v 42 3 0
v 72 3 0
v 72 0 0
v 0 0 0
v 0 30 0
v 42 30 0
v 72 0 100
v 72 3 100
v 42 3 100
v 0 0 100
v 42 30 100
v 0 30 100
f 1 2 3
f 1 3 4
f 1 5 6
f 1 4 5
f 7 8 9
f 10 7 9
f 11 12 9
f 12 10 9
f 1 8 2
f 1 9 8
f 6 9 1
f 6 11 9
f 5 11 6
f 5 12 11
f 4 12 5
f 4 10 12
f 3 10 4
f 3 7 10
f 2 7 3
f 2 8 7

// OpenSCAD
// file: Parts/Screw.scad
// created by IndiePandaaaaa | Lukas

$fn = 50;

function cone_diameter(diameter) = diameter * 2;

function cone_diameter_cutout(diameter) = diameter * 2 + 0.5;

function cone_height(diameter) = diameter * 0.75;

module screw(diameter, length = 12, cutout_sample = false) {
  module base_model(diameter, length, cone_height, cone_diameter, offset = 0) {
    rotate_extrude() {
      polygon([
          [0, 0],
          [(diameter + offset) / 2, 0],
          [(diameter + offset) / 2, (length + offset) - (cone_height + offset)],
          [(cone_diameter + offset) / 2, length + offset],
          [0, length + offset],
        ]);
    }
  }

  if (length < diameter) {
    echo("Screw is too short");
    length = diameter + 5;
    echo("New length is: ", length);
  }

  if (!cutout_sample) {
    translate([0, 0, -length])
      difference() {
        base_model(diameter, length, cone_height(diameter), cone_diameter(diameter));

        // top cross part
        translate([0, 0, length - (cone_height(diameter) - diameter / 2) + .1])
          difference() {
            rotate([0, 0, 45])
              rotate_extrude() {
                polygon([
                    [0, 0],
                    [diameter * 1.4 / 2, 0],
                    [cone_diameter(diameter) / 3, cone_height(diameter) - diameter / 2],
                    [0, cone_height(diameter) - diameter / 2],
                  ]);
              }
            for (i = [0 : 1 : 3]) {
              rotate([0, 0, 90 * i])
                translate([diameter / 3.18 / 2, diameter / 3.18 / 2, 0]) cube(cone_height(diameter));
            }
          }
      }
  } else {
    offset = 0;
    diameter = cone_diameter_cutout(diameter) / 2;  // is duplicated by function, used to reduce error
    translate([0, 0, -length - offset / 2]) {
      base_model(diameter, length, cone_height(diameter), cone_diameter(diameter), offset);
      translate([0, 0, length]) cylinder(r = diameter, h = 50);
    }
  }
}

module screw_corehole(diameter_screw, diameter_core, unthreaded_length, length = 12) {
  union() {
    screw(diameter_screw, unthreaded_length, true);
    translate([0, 0, -length]) cylinder(d = diameter_core, h = length - unthreaded_length + .1);
  }
}

translate([20, 0, 0]) screw(3.5, cutout_sample = false);
screw_corehole(diameter_screw = 3, diameter_core = 2.5, unthreaded_length = 15, length = 20);
// main file
// created by IndiePandaaaaa | Lukas

use <Parts/Screw.scad>

THICKNESS = 3.0;
TOLERANCE = 0.1;
CHAMFER = 1.5;
SCREW_OD = 3.5;
$fn = 75;

HEIGTH = 30; // Proxxon MB200 table
WIDTH = 100;
DEPTH = 42;
MOUNT_DEPTH = 30;

linear_extrude(WIDTH) {
  polygon([
      [0, 0],
      [DEPTH + MOUNT_DEPTH, 0],
      [DEPTH + MOUNT_DEPTH, THICKNESS],
      [DEPTH, THICKNESS],
      [DEPTH, HEIGTH],
      [0, HEIGTH],
    ]);
}
